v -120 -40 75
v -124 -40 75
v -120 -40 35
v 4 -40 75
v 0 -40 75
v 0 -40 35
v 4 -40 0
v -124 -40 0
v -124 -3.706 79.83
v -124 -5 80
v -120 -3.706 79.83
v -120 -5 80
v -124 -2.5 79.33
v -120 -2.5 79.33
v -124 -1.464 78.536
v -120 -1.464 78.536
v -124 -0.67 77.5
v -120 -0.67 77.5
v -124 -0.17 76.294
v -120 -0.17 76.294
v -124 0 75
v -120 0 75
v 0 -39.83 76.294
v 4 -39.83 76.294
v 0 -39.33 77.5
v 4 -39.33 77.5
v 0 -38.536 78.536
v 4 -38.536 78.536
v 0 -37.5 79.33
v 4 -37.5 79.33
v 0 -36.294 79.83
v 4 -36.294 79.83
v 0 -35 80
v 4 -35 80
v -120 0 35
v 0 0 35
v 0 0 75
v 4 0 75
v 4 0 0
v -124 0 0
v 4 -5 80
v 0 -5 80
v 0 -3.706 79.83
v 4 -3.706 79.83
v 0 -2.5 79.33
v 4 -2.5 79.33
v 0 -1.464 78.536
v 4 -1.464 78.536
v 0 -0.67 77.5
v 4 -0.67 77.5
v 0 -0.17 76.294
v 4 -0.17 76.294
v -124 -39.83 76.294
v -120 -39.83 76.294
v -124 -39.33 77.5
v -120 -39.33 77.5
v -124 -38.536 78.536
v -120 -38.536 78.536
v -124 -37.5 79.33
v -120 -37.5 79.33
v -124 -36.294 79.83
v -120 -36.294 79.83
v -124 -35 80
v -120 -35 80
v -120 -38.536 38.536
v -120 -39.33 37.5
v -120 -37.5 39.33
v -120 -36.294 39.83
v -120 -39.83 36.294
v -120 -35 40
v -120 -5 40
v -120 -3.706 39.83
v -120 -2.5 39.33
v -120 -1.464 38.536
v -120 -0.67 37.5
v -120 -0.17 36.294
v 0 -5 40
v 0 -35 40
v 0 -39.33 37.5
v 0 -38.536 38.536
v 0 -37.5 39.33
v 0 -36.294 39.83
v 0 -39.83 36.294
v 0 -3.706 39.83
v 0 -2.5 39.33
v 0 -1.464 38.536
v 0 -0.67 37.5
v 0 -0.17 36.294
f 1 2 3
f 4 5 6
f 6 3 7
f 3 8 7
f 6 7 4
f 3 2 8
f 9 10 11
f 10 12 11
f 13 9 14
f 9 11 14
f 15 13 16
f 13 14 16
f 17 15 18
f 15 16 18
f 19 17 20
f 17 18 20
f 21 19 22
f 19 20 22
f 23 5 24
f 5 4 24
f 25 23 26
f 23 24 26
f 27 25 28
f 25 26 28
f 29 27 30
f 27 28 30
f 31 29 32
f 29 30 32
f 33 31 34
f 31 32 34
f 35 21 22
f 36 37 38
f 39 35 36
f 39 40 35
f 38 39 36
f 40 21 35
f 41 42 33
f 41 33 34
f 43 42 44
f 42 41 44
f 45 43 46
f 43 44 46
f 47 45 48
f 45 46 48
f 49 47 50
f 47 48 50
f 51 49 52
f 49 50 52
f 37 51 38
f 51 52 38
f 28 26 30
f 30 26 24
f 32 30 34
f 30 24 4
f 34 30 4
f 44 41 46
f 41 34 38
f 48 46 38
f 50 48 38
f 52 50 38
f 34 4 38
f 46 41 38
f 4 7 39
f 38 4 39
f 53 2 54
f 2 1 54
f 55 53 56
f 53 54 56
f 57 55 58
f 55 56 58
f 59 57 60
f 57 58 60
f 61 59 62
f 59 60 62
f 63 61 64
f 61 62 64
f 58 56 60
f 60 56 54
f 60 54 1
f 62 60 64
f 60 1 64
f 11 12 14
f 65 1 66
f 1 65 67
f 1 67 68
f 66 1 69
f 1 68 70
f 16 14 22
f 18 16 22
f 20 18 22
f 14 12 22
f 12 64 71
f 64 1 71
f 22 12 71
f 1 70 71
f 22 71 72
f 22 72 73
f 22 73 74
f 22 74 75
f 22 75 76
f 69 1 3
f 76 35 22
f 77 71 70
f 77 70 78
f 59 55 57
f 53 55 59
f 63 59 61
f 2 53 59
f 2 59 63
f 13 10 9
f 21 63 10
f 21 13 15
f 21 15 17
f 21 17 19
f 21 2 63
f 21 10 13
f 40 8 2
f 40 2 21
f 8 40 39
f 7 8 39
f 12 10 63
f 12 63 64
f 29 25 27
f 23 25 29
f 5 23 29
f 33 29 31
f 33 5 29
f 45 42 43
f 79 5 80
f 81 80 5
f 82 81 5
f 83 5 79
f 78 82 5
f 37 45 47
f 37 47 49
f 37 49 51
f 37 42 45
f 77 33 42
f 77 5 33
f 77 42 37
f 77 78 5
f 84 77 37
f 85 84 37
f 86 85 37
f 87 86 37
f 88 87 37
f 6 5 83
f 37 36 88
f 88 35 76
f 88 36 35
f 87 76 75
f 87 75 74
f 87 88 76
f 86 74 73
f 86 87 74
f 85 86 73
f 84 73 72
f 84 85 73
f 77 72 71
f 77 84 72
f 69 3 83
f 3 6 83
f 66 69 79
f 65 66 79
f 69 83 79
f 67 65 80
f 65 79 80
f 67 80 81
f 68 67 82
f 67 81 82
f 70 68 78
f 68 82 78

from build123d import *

# Parameters (mm, degrees)
F1_W     = 120
F1_H     = 40
F2_DEPTH = 40
F1_W_2   = 4
F3_DEPTH = 80
F4_R     = 5


with BuildPart() as f2:
    # F1 (on Top) → F2 (new body)
    with BuildSketch(Plane.XY):
        with Locations((-60, -20)):
            Rectangle(F1_W, F1_H)
    extrude(amount=F2_DEPTH)

    # F1 (on Top) → F3 (join)
    with BuildSketch(Plane.XY):
        with Locations((2, -20)):
            Rectangle(F1_W_2, F1_H)
        with Locations((-122, -20)):
            Rectangle(F1_W_2, F1_H)
    extrude(amount=F3_DEPTH)

    # F4
    f4_edges = [f2.edges().sort_by_distance(p)[0] for p in [
        (-60, -40, 40),
        (-60, 0, 40),
        (-122, -40, 80),
        (-122, 0, 80),
        (2, -40, 80),
        (2, 0, 80),
    ]]
    fillet(f4_edges, radius=F4_R)


solid = f2.part
